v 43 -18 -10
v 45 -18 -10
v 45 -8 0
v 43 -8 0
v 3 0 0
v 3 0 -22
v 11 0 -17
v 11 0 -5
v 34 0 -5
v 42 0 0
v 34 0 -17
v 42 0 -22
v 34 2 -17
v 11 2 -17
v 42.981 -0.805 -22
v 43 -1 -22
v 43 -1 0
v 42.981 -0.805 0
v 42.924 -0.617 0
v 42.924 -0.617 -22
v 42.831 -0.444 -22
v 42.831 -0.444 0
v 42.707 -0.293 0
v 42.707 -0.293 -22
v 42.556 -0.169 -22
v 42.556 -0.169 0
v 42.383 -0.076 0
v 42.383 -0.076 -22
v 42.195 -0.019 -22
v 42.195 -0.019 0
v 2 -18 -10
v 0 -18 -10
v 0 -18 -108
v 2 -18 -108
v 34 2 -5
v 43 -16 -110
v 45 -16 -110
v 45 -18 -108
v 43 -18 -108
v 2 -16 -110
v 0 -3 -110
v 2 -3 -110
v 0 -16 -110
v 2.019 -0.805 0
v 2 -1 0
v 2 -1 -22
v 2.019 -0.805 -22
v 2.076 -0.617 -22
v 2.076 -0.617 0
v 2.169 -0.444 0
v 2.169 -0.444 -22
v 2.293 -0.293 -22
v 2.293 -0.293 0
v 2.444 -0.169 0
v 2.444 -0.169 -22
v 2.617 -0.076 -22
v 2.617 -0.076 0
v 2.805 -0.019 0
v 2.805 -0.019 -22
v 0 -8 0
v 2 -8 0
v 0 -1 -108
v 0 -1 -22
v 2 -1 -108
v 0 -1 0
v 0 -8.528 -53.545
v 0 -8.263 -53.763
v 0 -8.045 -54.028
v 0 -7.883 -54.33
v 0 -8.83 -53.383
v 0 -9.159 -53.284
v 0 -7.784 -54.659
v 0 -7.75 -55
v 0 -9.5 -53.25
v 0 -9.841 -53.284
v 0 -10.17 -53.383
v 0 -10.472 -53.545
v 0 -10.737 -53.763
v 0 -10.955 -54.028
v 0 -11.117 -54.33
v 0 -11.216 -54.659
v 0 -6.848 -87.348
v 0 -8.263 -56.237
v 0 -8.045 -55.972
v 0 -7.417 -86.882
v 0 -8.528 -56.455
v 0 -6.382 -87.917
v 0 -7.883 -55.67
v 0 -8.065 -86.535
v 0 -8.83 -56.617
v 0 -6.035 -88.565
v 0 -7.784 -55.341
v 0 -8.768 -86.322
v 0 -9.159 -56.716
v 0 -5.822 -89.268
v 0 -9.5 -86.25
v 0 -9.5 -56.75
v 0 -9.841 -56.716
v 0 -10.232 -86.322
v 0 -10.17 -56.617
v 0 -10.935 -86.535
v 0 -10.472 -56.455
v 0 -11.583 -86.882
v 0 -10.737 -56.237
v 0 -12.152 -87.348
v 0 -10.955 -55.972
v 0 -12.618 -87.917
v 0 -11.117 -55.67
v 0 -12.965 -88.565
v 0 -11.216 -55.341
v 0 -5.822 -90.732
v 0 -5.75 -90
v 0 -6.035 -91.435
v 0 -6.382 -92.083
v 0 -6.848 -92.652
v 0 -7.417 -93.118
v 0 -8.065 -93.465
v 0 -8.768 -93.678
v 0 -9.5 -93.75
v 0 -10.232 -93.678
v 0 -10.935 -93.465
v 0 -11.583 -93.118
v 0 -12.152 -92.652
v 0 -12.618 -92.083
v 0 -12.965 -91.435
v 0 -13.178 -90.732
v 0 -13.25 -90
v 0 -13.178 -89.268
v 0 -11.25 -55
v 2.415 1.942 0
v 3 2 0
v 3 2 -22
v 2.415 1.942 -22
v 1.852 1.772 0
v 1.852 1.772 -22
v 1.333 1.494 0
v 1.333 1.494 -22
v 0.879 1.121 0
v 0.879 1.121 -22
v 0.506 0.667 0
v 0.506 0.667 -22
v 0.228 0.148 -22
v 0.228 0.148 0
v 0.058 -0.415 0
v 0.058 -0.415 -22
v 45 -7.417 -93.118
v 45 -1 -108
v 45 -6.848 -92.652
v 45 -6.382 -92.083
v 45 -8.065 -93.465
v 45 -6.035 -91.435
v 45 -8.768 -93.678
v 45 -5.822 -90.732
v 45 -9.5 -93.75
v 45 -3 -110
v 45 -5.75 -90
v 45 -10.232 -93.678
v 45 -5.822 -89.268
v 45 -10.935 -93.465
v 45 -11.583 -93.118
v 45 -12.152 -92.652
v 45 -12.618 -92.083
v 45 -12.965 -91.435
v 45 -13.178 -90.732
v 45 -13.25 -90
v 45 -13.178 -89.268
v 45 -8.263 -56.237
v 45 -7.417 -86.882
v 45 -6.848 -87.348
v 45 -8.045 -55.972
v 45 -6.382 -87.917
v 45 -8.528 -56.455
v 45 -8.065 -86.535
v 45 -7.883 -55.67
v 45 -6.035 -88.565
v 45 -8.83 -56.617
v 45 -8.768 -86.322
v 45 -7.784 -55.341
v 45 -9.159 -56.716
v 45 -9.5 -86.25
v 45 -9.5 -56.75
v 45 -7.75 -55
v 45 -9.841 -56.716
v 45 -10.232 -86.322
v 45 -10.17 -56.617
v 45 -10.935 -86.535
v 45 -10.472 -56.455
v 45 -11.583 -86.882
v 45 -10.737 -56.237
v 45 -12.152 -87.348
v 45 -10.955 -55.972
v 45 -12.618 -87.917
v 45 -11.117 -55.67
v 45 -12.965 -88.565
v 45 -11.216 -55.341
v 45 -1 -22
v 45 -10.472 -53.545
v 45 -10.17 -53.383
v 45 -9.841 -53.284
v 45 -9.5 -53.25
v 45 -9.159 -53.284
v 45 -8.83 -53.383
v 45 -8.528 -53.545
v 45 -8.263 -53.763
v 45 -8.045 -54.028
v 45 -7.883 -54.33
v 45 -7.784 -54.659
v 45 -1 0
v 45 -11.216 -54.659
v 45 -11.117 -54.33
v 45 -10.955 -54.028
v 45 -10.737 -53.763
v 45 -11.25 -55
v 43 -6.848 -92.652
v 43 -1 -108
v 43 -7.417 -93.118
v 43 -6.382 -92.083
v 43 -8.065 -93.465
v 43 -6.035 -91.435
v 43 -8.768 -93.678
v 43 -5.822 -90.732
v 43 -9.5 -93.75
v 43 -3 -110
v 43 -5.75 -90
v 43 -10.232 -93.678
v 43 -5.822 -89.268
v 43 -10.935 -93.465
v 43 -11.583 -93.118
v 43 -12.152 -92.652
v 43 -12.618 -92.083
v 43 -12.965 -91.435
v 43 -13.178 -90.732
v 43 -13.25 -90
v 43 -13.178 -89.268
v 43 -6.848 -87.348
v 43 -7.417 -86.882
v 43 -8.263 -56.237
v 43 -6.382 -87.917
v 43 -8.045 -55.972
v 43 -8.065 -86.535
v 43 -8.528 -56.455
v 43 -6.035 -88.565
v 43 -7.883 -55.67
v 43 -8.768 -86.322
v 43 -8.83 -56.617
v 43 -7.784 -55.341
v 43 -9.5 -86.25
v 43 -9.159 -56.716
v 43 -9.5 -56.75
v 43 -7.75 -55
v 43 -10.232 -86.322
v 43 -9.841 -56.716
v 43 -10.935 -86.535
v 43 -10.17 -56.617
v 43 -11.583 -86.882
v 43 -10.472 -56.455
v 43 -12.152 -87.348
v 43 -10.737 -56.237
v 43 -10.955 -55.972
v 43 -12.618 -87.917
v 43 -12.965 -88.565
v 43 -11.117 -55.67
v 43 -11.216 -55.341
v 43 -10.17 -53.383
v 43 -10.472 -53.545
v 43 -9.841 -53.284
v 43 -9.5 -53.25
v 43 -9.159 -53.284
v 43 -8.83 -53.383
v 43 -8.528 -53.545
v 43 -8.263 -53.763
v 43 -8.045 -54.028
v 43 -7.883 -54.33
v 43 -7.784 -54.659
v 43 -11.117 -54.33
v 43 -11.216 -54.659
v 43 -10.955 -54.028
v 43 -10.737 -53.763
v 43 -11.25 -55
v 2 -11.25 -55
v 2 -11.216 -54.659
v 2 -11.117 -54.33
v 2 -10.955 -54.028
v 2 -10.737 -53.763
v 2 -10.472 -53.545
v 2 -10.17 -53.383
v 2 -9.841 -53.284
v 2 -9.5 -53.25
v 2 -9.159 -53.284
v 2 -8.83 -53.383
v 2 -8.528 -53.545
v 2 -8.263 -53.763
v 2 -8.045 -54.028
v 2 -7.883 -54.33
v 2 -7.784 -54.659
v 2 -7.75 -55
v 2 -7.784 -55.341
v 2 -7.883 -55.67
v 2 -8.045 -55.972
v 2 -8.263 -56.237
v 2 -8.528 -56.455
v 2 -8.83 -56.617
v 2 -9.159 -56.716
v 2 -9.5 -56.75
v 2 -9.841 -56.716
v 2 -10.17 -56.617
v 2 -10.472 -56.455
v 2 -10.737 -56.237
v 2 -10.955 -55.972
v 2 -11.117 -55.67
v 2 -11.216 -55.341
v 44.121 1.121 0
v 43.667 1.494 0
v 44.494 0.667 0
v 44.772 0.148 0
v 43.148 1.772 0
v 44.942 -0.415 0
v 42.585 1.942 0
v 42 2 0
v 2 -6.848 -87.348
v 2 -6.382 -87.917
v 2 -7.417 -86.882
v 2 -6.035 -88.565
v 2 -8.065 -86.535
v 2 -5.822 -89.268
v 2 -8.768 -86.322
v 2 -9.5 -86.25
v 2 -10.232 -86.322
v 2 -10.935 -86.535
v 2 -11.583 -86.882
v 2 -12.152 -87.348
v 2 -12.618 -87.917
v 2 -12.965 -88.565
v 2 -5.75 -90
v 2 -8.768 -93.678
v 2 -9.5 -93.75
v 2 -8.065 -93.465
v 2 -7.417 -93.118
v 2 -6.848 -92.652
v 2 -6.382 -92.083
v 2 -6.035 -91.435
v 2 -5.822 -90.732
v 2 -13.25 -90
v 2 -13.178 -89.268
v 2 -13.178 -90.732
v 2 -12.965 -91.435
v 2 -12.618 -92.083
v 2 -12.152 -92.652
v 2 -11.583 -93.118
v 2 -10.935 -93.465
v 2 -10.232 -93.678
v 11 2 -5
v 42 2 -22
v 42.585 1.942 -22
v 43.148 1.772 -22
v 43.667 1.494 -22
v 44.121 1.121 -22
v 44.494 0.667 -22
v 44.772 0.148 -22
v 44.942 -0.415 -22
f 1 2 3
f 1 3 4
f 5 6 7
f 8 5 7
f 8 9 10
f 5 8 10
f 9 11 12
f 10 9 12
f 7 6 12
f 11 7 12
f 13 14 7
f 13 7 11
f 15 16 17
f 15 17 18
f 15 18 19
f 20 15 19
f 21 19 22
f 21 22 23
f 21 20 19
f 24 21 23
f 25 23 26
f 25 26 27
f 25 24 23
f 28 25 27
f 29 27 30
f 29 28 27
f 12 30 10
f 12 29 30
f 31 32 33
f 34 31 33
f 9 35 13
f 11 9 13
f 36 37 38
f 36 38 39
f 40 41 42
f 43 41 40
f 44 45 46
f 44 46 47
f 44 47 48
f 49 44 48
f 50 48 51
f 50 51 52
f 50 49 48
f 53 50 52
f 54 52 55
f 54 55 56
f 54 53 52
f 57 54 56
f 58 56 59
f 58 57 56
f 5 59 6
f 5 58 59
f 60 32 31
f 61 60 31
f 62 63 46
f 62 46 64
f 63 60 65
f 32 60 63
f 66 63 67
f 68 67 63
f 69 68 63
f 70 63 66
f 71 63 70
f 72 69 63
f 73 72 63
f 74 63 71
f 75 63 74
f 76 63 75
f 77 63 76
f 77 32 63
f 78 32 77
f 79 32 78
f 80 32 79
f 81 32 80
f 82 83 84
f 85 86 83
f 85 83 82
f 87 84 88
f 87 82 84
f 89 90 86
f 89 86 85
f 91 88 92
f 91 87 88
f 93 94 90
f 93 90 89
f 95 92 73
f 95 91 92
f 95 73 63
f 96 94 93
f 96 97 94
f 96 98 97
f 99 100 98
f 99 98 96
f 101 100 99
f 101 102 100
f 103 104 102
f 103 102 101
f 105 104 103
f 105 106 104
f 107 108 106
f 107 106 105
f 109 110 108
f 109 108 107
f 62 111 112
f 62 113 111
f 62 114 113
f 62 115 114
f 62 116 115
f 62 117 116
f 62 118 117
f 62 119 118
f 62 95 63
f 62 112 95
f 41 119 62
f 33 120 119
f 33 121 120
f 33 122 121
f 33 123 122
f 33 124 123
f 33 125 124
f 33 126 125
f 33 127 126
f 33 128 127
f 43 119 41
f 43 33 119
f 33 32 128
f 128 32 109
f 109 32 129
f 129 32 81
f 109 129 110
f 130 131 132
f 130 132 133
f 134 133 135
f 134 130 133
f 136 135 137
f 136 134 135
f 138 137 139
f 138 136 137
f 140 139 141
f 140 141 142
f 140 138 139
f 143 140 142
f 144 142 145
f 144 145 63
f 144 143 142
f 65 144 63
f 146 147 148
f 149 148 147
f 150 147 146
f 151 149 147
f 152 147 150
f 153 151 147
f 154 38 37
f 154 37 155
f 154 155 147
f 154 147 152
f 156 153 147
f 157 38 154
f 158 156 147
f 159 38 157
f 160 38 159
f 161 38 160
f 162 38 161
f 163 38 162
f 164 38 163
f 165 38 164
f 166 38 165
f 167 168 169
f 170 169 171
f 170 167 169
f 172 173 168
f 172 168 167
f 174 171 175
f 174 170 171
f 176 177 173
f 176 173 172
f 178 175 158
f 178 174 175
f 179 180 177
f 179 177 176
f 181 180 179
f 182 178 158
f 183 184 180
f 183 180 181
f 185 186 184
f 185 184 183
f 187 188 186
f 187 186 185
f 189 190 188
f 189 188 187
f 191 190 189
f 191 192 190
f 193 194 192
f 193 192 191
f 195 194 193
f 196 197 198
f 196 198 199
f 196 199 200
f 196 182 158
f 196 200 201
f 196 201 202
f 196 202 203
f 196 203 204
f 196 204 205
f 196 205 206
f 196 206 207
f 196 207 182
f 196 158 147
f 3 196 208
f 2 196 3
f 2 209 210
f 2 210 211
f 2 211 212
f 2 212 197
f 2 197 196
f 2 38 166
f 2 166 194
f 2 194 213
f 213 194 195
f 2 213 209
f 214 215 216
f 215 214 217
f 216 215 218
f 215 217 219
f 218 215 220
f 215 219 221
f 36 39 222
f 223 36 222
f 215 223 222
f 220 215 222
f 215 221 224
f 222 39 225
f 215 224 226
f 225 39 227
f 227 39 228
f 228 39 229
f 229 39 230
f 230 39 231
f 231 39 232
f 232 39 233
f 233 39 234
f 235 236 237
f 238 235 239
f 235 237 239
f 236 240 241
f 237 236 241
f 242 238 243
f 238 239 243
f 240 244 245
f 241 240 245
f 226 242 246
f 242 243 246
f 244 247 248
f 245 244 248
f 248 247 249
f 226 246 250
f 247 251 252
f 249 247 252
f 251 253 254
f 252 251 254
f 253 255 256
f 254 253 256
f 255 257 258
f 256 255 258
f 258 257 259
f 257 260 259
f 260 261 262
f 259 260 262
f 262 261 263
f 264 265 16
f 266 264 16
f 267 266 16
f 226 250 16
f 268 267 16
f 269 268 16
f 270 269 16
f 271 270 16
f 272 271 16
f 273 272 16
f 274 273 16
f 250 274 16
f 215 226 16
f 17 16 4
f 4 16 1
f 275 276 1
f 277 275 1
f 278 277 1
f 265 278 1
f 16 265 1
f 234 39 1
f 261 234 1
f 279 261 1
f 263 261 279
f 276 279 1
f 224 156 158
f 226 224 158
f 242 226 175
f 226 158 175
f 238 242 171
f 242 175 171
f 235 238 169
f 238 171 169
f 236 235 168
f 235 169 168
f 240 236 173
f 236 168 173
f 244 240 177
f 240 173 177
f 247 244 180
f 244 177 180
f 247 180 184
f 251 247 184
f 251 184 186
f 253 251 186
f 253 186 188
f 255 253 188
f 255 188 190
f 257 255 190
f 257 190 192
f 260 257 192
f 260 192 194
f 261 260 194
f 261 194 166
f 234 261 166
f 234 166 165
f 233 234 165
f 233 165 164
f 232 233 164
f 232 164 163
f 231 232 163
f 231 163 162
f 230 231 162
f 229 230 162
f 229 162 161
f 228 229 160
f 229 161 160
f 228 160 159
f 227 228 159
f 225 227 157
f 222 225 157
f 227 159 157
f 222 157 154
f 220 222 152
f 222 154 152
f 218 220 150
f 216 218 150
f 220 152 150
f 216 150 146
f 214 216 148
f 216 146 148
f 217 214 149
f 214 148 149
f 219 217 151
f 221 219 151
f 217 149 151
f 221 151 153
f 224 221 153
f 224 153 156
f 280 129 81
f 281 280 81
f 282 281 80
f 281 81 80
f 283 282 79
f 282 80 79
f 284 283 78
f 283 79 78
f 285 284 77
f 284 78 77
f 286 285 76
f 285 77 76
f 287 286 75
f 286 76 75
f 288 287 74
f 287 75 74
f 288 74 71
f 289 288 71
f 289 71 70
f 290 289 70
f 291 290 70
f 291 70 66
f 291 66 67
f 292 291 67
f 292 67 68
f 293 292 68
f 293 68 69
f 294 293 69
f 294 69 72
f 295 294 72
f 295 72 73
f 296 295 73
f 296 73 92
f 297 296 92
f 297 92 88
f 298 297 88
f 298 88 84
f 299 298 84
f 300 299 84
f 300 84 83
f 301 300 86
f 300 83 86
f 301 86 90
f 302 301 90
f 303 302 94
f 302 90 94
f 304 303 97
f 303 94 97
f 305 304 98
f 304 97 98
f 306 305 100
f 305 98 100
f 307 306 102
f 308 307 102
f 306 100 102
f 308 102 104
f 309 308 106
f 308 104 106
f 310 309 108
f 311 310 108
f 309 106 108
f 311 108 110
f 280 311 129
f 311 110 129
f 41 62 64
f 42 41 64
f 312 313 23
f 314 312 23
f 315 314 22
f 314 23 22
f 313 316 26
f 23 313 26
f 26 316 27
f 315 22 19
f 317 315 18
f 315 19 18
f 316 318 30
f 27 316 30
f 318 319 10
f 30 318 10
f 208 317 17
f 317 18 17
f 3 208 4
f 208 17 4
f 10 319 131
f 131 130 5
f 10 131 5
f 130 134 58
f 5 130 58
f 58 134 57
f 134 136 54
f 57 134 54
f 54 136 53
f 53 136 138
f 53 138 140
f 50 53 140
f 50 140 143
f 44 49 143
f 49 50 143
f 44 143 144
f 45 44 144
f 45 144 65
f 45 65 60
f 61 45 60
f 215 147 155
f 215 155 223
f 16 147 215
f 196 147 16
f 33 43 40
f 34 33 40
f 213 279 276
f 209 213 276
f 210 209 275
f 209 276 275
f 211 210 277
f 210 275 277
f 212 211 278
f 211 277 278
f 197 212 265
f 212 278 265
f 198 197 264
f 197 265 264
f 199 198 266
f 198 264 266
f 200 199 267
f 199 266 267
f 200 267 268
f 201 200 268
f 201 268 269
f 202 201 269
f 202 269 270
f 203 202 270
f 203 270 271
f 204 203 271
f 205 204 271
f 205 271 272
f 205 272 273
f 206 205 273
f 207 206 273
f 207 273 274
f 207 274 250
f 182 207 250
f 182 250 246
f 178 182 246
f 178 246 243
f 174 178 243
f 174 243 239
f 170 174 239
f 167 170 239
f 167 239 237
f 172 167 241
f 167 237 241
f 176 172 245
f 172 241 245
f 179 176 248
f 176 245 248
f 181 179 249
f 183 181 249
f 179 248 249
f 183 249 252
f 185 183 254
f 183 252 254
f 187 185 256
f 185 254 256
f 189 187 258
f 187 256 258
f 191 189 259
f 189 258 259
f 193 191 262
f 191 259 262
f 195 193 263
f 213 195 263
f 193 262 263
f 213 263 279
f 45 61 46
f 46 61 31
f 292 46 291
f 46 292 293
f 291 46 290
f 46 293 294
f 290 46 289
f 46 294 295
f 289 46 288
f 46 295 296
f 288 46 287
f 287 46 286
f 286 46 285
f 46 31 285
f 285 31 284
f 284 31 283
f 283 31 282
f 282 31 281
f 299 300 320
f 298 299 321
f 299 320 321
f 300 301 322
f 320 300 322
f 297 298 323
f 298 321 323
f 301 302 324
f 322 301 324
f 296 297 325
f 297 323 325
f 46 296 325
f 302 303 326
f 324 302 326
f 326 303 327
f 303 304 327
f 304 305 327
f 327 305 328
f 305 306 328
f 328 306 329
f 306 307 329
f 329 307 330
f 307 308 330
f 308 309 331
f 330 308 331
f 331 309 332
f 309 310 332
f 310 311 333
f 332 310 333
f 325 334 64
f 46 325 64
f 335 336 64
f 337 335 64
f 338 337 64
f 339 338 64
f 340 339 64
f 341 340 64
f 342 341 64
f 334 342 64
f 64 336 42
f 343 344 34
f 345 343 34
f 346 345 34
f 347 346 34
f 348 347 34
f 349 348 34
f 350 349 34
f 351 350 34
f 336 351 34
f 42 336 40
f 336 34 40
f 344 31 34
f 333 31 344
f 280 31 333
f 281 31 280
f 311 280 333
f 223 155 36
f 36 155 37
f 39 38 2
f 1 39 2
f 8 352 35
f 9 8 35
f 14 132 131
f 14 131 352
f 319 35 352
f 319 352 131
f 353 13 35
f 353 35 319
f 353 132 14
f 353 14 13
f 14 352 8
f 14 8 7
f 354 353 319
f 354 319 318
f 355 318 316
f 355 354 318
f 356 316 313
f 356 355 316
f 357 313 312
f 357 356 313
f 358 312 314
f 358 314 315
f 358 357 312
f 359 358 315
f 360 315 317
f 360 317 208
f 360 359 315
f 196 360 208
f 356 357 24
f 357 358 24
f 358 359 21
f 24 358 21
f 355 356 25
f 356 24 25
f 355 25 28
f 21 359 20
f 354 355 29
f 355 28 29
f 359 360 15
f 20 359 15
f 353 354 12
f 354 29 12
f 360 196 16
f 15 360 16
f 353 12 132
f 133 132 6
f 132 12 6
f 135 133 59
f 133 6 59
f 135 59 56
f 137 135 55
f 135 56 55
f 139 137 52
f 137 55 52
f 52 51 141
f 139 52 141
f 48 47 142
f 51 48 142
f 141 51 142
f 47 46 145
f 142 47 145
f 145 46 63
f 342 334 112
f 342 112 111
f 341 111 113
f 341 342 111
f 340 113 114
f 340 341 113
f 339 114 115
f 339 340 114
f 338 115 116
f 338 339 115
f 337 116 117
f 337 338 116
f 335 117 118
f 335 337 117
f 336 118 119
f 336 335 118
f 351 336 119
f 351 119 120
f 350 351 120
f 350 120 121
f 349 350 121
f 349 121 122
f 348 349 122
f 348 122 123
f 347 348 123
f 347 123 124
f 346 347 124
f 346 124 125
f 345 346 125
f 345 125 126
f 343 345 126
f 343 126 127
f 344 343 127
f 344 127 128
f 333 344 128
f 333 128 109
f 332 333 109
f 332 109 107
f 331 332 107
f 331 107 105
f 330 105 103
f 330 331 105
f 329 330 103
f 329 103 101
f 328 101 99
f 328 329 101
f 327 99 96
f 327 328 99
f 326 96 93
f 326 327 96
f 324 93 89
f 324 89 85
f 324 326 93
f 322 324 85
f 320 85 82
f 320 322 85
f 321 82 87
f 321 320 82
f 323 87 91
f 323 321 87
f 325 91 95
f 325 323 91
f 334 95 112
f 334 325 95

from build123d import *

# Parameters (mm, degrees)
SKETCH1_W                      = 45
SKETCH1_H                      = 22
BASE_FLANGE1_DEPTH             = 2
EDGE_FLANGE1_STRIP_W           = 10
EDGE_FLANGE1_STRIP_H           = 2
EDGE_FLANGE1_STRIP_CUT_DEPTH   = 22
EDGE_FLANGE1_STRIP_2_W         = 10
EDGE_FLANGE1_STRIP_2_H         = 2
EDGE_FLANGE1_STRIP_CUT_2_DEPTH = 22
EDGE_FLANGE1_DEPTH             = 22
EDGE_FLANGE1_PROFILE_W         = 110
EDGE_FLANGE1_PROFILE_H         = 17
EDGE_FLANGE1_FLAT_DEPTH        = 2
EDGE_FLANGE1_BEND_DEPTH        = 22
EDGE_FLANGE1_PROFILE_2_W       = 110
EDGE_FLANGE1_PROFILE_2_H       = 17
EDGE_FLANGE1_FLAT_2_DEPTH      = 2
SKETCH24_R                     = 3.75
CUT_EXTRUDE1_DEPTH             = 10
CUT_EXTRUDE2_START             = -10
SKETCH25_R                     = 3.75
CUT_EXTRUDE2_DEPTH             = 10
SKETCH28_R                     = 1.75
CUT_EXTRUDE3_DEPTH             = 121.203993278
SKETCH29_W                     = 23
SKETCH29_H                     = 12
CUT_EXTRUDE4_DEPTH             = 10
CHAMFER1_SIZE                  = 2
CHAMFER2_SIZE                  = 10


# Sheet-metal steps are written as plain solids
with BuildPart() as part:
    # Sketch1 → Base-Flange1 (new body)
    with BuildSketch(Plane(origin=(0, 0, 0), x_dir=(1, 0, 0), z_dir=(0, 1, 0))):
        with Locations((22.5, 11)):
            Rectangle(SKETCH1_W, SKETCH1_H)
    extrude(amount=BASE_FLANGE1_DEPTH)

    # Edge-Flange1 strip (across the edge) → Edge-Flange1 strip cut (cut)
    with BuildSketch(Plane(origin=(45, 0, -22), x_dir=(-1, 0, 0), z_dir=(0, 0, 1))):
        with Locations((-2, -1)):
            Rectangle(EDGE_FLANGE1_STRIP_W, EDGE_FLANGE1_STRIP_H)
    extrude(amount=EDGE_FLANGE1_STRIP_CUT_DEPTH, mode=Mode.SUBTRACT)

    # Edge-Flange1 strip 2 (across the edge) → Edge-Flange1 strip cut 2 (cut)
    with BuildSketch(Plane(origin=(0, 0, 0), x_dir=(1, 0, 0), z_dir=(0, 0, -1))):
        with Locations((-2, -1)):
            Rectangle(EDGE_FLANGE1_STRIP_2_W, EDGE_FLANGE1_STRIP_2_H)
    extrude(amount=EDGE_FLANGE1_STRIP_CUT_2_DEPTH, mode=Mode.SUBTRACT)

    # Edge-Flange1 bend section (across the edge) → Edge-Flange1 (add)
    with BuildSketch(Plane(origin=(45, 0, -22), x_dir=(-1, 0, 0), z_dir=(0, 0, 1))):
        with BuildLine():
            Line((0, 1), (2, 1))
            ThreePointArc((2, 1), (2.292893219, 0.292893219), (3, 0))
            Line((3, 0), (3, -2))
            ThreePointArc((3, -2), (0.878679656, -1.121320344), (0, 1))
        make_face()
    extrude(amount=EDGE_FLANGE1_DEPTH)

    # Edge-Flange1 profile (on flange) → Edge-Flange1 flat (add)
    with BuildSketch(Plane(origin=(45, 0, 0), x_dir=(0, 0, 1), z_dir=(1, 0, 0))):
        with Locations((-55, 9.5)):
            Rectangle(EDGE_FLANGE1_PROFILE_W, EDGE_FLANGE1_PROFILE_H)
    extrude(amount=-EDGE_FLANGE1_FLAT_DEPTH)

    # Edge-Flange1 bend section 2 (across the edge) → Edge-Flange1 bend (add)
    with BuildSketch(Plane(origin=(0, 0, 0), x_dir=(1, 0, 0), z_dir=(0, 0, -1))):
        with BuildLine():
            Line((0, 1), (2, 1))
            ThreePointArc((2, 1), (2.292893219, 0.292893219), (3, 0))
            Line((3, 0), (3, -2))
            ThreePointArc((3, -2), (0.878679656, -1.121320344), (0, 1))
        make_face()
    extrude(amount=EDGE_FLANGE1_BEND_DEPTH)

    # Edge-Flange1 profile 2 (on flange) → Edge-Flange1 flat 2 (add)
    with BuildSketch(Plane(origin=(0, 0, 0), x_dir=(0, 0, -1), z_dir=(-1, 0, 0))):
        with Locations((55, 9.5)):
            Rectangle(EDGE_FLANGE1_PROFILE_2_W, EDGE_FLANGE1_PROFILE_2_H)
    extrude(amount=-EDGE_FLANGE1_FLAT_2_DEPTH)

    # Sketch24 → Cut-Extrude1 (cut)
    with BuildSketch(Plane(origin=(45, 0, 0), x_dir=(0, 0, -1), z_dir=(1, 0, 0))):
        with Locations(Location((90, -9.5, 0), (0, 0, 90))):
            Circle(SKETCH24_R)
    extrude(amount=-CUT_EXTRUDE1_DEPTH, mode=Mode.SUBTRACT)

    # Sketch25 → Cut-Extrude2 (cut)
    with BuildSketch(Plane.ZY.offset(CUT_EXTRUDE2_START)):
        with Locations(Location((-90, -9.5, 0), (0, 0, 90))):
            Circle(SKETCH25_R)
    extrude(amount=CUT_EXTRUDE2_DEPTH, mode=Mode.SUBTRACT)

    # Sketch28 → Cut-Extrude3 (cut, through all)
    with BuildSketch(Plane.ZY):
        with Locations(Location((-55, -9.5, 0), (0, 0, 270))):
            Circle(SKETCH28_R)
    extrude(amount=-CUT_EXTRUDE3_DEPTH, mode=Mode.SUBTRACT)

    # Sketch29 → Cut-Extrude4 (cut)
    with BuildSketch(Plane(origin=(0, 2, 0), x_dir=(1, 0, 0), z_dir=(0, 1, 0))):
        with Locations((22.5, 11)):
            Rectangle(SKETCH29_W, SKETCH29_H)
    extrude(amount=-CUT_EXTRUDE4_DEPTH, mode=Mode.SUBTRACT)

    # Chamfer1
    chamfer1_edges = [part.edges().sort_by_distance(p)[0] for p in [
        (44, -1, -110),
        (44, -18, -110),
        (1, -1, -110),
        (1, -18, -110),
    ]]
    chamfer(chamfer1_edges, length=CHAMFER1_SIZE)

    # Chamfer2
    chamfer2_edges = [part.edges().sort_by_distance(p)[0] for p in [
        (44, -18, 0),
        (1, -18, 0),
    ]]
    chamfer(chamfer2_edges, length=CHAMFER2_SIZE)


solid = part.part
